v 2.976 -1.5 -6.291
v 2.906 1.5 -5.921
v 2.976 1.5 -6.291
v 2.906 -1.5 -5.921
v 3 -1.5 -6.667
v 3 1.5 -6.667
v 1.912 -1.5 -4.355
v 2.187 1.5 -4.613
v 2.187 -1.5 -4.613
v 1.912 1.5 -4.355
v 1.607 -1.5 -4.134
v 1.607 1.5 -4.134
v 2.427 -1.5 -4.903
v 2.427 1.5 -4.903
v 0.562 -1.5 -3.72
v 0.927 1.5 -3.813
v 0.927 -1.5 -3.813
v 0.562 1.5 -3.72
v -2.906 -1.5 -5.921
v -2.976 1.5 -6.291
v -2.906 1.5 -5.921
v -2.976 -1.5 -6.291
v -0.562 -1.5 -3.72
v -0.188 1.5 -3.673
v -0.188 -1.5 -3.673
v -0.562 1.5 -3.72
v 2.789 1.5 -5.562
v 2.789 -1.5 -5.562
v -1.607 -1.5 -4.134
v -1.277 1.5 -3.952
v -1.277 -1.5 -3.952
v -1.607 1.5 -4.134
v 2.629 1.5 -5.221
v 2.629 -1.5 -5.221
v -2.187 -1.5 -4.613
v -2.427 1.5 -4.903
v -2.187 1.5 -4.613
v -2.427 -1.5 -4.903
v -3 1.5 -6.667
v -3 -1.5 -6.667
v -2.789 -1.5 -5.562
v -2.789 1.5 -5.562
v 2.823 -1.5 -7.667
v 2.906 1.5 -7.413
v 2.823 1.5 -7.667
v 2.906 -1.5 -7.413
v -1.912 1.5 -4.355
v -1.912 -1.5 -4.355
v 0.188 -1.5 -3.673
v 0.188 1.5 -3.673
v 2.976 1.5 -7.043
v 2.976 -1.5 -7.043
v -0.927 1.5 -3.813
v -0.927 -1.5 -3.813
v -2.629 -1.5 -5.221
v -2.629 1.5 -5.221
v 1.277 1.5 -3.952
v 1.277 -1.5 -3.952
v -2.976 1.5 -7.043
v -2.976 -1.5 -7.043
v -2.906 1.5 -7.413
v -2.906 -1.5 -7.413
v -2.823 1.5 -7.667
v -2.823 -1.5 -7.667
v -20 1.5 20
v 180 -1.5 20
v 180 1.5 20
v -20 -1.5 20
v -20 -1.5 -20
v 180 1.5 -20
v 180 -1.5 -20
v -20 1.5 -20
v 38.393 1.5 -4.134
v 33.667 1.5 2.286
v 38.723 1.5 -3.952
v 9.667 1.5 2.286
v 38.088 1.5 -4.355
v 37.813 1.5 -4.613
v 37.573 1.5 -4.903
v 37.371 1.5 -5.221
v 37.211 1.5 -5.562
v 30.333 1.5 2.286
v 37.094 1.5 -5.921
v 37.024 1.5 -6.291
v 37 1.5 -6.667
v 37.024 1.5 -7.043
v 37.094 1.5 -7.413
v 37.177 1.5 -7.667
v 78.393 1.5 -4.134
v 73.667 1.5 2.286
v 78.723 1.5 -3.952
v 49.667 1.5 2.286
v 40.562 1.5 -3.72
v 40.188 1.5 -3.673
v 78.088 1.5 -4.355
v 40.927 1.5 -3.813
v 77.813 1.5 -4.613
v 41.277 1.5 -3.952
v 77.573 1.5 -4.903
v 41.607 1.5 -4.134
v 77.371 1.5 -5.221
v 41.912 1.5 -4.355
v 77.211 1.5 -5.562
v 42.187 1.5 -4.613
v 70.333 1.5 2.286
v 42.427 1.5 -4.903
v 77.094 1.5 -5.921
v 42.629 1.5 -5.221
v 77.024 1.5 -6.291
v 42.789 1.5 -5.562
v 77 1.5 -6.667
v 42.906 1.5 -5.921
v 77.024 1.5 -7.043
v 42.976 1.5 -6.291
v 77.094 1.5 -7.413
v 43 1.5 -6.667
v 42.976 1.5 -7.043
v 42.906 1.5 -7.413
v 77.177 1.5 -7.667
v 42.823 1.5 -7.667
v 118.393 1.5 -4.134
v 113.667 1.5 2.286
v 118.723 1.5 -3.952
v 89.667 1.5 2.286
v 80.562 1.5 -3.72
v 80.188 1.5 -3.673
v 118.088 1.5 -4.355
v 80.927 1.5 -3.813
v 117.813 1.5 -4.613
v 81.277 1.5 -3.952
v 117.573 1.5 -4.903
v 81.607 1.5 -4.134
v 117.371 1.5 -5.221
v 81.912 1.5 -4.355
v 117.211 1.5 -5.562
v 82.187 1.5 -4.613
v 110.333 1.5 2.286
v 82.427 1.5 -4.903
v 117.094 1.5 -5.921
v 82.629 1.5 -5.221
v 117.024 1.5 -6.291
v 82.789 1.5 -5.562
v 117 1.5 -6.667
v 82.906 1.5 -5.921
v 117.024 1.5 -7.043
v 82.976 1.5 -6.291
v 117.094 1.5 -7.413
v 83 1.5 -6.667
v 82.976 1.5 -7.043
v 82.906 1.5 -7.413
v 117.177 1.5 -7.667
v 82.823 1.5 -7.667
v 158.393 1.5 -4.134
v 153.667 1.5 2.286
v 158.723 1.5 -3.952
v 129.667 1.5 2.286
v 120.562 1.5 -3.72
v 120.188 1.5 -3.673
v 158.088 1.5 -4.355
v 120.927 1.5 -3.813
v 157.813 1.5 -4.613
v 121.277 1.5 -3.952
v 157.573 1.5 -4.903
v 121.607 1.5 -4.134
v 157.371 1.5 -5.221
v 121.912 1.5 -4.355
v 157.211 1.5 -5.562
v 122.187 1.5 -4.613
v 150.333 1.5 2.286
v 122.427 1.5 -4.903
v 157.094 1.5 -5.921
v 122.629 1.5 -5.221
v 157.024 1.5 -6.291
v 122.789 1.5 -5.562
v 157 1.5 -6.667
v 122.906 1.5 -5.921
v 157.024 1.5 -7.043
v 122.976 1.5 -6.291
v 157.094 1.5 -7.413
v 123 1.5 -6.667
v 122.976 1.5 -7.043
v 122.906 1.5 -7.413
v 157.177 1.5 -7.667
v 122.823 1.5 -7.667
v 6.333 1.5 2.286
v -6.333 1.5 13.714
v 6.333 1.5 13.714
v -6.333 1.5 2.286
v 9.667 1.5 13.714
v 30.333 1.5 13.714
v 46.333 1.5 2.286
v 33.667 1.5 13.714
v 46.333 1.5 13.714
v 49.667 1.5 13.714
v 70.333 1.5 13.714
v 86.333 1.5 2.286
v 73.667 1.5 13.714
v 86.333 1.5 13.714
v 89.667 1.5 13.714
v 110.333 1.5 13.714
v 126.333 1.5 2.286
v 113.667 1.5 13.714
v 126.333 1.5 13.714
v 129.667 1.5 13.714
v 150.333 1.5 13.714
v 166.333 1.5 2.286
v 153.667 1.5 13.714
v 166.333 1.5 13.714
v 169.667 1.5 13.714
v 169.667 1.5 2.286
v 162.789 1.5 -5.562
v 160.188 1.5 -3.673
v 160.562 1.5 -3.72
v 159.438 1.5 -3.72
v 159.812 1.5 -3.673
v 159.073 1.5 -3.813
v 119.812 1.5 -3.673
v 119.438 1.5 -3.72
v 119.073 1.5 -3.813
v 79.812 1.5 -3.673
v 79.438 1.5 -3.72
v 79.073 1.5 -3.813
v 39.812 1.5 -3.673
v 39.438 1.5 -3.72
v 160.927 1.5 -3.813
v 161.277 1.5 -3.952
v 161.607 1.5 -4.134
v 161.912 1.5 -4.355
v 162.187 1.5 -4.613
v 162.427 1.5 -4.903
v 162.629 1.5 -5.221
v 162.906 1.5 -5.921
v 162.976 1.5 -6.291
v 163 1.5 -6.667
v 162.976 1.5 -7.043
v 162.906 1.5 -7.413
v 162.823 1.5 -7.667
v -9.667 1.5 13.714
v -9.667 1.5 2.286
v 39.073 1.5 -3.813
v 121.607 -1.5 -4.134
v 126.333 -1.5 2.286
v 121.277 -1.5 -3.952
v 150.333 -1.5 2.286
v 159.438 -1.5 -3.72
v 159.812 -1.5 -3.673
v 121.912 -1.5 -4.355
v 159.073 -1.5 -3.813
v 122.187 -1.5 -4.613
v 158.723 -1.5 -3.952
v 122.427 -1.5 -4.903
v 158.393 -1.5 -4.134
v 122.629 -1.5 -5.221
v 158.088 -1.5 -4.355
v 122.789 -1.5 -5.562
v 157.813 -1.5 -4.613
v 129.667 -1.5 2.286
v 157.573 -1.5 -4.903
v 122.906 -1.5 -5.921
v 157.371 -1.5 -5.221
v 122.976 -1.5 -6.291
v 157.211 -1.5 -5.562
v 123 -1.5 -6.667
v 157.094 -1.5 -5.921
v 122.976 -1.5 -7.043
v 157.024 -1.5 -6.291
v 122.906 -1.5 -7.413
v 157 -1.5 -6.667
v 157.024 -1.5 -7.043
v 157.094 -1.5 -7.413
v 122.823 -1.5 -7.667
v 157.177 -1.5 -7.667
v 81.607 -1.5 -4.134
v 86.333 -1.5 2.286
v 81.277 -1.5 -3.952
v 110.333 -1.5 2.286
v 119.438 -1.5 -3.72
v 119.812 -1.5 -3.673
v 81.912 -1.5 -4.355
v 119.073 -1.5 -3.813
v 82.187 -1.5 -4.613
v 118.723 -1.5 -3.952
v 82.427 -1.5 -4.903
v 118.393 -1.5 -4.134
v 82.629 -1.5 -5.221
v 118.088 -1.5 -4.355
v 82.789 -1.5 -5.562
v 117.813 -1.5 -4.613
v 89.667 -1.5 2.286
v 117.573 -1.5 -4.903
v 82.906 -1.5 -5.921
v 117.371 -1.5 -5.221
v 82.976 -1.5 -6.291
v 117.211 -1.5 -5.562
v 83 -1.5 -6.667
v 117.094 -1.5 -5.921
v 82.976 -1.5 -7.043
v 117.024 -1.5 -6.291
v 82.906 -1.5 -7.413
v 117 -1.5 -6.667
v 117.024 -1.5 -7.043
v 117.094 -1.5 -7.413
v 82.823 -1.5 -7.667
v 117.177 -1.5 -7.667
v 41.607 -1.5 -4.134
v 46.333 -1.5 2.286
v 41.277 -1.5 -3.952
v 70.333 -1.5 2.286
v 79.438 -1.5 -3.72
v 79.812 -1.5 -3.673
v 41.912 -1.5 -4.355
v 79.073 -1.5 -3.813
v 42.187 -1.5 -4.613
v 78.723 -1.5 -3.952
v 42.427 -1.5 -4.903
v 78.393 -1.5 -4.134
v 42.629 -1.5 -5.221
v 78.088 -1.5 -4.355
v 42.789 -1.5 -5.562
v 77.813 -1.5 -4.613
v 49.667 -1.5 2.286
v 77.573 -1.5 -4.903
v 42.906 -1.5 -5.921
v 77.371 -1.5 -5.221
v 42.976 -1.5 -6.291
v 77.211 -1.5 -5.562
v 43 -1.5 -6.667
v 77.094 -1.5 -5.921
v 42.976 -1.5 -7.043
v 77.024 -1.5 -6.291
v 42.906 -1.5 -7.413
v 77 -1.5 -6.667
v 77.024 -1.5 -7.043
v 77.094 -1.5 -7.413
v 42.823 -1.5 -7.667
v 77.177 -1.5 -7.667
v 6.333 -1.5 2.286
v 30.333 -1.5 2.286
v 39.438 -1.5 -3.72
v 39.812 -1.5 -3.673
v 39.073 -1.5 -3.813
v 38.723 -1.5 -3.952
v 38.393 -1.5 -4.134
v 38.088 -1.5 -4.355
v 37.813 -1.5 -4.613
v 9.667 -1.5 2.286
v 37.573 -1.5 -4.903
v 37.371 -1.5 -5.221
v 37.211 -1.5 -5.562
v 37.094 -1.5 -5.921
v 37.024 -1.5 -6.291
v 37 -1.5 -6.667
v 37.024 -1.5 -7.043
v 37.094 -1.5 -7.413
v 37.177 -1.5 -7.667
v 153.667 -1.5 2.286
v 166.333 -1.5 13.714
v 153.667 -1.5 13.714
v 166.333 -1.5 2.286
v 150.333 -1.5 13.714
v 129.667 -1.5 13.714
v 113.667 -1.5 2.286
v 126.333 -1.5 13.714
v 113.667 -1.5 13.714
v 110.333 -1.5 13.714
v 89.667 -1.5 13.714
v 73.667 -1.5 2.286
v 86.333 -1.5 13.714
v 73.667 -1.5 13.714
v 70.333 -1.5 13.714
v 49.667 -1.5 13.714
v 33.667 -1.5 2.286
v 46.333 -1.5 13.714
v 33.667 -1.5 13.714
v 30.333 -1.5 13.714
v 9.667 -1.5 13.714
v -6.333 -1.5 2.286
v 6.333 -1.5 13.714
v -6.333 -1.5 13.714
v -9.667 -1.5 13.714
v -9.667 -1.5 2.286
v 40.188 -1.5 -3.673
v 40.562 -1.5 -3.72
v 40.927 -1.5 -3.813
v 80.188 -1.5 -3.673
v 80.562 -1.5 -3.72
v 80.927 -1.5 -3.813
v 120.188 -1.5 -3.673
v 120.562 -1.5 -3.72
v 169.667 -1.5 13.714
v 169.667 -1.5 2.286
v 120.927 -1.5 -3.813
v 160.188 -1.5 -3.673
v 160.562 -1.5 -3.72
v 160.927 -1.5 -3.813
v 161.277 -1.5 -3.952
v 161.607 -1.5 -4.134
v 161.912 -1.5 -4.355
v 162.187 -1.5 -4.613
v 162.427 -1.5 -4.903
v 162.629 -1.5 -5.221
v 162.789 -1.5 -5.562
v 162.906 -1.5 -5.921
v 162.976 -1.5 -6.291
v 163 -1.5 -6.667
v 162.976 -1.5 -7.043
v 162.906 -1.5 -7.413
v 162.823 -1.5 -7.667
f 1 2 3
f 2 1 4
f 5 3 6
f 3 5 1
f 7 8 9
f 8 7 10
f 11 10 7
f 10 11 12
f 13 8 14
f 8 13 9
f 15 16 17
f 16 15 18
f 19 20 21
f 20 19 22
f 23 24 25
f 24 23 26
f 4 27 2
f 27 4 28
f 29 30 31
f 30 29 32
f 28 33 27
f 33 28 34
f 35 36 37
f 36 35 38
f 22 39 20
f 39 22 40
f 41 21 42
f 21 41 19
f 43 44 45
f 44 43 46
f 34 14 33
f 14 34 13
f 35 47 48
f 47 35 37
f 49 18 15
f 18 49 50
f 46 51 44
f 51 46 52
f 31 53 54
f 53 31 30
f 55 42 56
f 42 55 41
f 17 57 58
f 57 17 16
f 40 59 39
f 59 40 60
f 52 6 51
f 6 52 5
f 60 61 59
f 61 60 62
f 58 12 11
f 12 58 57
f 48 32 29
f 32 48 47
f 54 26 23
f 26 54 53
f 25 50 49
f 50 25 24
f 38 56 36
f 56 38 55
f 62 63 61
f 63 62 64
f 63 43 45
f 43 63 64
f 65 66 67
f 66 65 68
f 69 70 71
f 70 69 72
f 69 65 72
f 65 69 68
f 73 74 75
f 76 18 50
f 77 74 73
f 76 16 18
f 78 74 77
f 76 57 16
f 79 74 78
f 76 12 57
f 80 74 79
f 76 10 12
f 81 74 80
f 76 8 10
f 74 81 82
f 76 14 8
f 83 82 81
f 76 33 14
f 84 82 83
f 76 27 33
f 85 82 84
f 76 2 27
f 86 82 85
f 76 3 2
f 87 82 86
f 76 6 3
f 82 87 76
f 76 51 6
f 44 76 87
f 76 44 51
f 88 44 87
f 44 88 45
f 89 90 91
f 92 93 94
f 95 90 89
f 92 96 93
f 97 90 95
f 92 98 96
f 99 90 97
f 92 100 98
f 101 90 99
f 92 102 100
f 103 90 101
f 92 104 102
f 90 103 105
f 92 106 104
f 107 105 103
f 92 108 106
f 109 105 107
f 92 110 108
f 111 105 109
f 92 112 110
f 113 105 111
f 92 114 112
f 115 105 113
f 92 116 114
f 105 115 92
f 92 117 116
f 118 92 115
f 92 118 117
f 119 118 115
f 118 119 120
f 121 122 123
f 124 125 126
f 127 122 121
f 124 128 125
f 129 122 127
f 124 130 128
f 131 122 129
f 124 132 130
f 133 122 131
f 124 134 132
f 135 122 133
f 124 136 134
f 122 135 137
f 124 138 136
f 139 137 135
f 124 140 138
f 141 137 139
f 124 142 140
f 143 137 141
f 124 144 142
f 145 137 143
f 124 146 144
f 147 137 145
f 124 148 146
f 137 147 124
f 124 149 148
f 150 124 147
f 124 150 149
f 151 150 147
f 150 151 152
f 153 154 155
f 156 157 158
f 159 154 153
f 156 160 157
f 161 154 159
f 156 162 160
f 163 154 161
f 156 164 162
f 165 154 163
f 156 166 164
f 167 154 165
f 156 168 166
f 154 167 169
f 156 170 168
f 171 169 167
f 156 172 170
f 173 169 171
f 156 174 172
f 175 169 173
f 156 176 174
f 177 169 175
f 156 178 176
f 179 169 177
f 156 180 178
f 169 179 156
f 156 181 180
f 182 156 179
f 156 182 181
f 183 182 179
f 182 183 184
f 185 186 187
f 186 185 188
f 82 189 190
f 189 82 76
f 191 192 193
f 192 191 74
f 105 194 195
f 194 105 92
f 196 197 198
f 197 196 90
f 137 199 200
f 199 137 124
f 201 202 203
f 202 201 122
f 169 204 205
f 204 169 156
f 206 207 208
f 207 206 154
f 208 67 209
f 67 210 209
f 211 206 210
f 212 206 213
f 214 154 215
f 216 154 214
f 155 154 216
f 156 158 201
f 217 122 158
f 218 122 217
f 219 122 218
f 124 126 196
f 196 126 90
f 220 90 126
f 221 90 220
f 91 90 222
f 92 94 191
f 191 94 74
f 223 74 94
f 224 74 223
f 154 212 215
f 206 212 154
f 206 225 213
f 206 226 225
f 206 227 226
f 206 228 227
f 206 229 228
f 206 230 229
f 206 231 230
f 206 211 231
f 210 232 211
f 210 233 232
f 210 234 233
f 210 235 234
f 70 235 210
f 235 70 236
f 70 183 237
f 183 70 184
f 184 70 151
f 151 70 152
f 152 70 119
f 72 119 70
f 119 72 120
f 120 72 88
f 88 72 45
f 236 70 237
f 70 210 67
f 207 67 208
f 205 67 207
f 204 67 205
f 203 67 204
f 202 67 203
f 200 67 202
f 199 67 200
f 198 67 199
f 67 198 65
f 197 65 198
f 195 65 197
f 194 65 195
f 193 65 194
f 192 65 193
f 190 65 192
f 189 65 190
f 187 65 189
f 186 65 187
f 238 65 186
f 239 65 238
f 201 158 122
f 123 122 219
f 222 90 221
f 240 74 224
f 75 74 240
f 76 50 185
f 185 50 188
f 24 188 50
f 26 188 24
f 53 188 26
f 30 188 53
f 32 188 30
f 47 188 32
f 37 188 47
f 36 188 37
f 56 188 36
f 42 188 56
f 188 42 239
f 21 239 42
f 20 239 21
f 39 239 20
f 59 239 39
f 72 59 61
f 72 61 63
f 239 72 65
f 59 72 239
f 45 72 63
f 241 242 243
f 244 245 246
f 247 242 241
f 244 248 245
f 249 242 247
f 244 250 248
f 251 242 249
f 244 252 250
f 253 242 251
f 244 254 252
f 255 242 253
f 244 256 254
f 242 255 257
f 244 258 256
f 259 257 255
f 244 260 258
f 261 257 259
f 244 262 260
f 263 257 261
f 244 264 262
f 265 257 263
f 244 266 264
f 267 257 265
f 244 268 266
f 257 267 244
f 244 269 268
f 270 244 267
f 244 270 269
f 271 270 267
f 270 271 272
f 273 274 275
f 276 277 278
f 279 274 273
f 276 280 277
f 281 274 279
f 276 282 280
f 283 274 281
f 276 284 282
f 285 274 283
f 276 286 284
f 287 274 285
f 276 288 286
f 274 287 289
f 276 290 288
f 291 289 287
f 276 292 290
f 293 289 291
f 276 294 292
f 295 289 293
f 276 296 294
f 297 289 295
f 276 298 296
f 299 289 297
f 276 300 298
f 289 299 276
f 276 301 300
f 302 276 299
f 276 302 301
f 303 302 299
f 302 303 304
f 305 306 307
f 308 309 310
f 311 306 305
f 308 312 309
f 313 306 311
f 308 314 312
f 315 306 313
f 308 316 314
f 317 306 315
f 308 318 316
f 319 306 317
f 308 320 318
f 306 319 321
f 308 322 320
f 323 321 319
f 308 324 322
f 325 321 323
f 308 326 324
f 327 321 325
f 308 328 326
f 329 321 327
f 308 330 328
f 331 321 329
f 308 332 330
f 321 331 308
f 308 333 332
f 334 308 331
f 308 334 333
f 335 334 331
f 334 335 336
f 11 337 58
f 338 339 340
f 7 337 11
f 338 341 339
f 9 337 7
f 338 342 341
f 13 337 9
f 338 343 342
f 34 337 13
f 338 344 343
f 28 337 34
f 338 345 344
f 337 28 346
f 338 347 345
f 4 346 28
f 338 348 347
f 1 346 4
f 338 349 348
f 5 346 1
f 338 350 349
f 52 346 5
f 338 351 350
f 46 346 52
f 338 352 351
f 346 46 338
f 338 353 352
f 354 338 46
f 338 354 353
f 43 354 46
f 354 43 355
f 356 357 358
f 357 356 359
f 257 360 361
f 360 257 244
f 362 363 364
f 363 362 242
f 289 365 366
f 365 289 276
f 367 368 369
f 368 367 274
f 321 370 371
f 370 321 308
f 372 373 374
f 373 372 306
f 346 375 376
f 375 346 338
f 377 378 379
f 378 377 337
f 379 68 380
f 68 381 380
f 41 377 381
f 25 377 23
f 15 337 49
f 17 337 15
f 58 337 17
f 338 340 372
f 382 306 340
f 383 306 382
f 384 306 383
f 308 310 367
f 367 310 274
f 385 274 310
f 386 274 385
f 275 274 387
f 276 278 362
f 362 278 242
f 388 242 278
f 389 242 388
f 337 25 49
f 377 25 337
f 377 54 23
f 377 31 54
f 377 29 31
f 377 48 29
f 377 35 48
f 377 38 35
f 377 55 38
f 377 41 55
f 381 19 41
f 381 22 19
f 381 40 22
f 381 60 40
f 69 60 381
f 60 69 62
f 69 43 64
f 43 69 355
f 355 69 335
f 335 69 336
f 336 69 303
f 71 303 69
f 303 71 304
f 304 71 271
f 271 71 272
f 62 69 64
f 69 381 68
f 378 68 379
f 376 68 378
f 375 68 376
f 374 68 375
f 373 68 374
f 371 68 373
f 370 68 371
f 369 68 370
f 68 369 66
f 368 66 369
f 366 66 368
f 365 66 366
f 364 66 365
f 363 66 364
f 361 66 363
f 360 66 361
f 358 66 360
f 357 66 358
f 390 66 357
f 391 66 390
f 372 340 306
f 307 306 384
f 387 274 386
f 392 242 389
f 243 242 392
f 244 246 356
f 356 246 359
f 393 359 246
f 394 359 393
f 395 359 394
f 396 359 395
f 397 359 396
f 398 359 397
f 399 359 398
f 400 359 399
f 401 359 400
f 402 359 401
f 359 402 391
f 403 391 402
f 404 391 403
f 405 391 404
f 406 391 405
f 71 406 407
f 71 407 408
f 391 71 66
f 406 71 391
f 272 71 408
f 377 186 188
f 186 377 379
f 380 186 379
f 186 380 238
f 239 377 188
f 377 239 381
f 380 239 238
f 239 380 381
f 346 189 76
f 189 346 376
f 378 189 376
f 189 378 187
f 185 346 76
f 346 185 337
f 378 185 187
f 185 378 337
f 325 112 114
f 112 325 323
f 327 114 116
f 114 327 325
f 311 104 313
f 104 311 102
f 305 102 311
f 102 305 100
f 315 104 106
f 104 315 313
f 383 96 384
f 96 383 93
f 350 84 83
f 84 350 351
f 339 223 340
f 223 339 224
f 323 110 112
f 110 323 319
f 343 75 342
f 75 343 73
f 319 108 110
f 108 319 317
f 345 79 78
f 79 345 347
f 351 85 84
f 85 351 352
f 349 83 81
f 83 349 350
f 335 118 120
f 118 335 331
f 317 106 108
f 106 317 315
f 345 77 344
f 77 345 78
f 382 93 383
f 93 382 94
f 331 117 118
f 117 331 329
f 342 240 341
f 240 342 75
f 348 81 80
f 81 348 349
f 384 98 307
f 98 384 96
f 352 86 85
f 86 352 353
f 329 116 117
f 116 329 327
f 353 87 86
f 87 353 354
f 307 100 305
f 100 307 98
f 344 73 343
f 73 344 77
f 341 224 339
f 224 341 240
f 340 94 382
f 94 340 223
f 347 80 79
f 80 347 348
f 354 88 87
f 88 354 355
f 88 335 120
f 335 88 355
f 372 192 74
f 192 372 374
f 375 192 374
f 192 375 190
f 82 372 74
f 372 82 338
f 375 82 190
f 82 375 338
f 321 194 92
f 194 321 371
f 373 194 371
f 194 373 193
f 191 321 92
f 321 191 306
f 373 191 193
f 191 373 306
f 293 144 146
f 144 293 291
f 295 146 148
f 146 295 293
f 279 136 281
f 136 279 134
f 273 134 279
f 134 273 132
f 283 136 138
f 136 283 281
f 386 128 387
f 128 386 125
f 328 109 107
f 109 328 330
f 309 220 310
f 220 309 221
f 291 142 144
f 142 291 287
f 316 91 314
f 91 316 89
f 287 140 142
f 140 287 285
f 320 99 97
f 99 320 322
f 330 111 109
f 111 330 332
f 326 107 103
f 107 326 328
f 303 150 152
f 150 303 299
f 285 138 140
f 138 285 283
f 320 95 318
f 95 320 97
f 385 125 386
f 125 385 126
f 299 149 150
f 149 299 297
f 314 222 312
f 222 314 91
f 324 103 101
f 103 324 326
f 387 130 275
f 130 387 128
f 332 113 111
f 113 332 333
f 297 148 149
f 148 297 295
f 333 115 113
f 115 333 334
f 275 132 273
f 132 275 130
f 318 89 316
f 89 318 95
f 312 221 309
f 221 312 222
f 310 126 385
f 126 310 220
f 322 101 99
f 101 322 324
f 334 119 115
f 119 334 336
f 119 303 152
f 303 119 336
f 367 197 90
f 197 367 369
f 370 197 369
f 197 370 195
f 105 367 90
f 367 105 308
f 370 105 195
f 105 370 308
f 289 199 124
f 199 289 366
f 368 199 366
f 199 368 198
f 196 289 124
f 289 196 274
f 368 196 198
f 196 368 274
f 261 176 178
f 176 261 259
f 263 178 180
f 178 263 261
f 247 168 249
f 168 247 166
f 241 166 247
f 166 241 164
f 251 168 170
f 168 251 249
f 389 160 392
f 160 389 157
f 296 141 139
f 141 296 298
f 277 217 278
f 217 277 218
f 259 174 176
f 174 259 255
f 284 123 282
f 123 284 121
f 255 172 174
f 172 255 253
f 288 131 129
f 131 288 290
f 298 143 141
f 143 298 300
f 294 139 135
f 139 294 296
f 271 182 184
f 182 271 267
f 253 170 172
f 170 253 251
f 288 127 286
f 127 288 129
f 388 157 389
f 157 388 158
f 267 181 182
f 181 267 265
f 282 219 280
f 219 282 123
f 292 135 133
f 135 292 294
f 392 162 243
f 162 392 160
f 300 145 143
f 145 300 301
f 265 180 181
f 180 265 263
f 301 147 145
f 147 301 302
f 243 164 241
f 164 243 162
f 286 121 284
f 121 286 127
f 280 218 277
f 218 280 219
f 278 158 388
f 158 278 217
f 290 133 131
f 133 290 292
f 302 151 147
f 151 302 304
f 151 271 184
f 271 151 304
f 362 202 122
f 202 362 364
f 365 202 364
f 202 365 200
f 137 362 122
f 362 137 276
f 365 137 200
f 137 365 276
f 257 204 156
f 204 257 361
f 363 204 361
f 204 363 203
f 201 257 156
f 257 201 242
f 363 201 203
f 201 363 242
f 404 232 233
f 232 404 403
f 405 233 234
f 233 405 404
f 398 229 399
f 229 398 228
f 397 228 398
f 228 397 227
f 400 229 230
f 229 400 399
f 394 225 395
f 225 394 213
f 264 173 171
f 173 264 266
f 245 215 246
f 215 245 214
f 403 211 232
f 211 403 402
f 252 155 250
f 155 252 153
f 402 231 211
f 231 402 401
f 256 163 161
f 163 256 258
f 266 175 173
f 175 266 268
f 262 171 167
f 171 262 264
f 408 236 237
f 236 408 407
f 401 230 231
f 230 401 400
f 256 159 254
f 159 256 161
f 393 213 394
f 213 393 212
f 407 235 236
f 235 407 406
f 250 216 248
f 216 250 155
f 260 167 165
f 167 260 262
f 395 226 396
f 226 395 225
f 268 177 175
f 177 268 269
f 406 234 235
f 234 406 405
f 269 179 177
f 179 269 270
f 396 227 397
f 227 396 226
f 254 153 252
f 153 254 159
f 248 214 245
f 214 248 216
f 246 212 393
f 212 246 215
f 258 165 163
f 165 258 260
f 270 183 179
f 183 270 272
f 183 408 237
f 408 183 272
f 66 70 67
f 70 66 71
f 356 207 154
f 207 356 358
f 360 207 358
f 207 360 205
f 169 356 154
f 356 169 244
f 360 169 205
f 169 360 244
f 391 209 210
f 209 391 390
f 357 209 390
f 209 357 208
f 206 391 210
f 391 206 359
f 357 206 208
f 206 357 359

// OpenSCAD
/*Outlet settings*/
outletWidth = 40;
outletHeight = 40;
outletThickness = 3;
holeRadius = outletWidth / 13.333333333333;

module outlet(w, t, h) {
    difference() {
        cube([w, t, h], center=true);
        translate([-w/5, 0, h/5]) {
            cube([(h/6) / 2, t*2, h/3.5], center=true);
        }
        translate([w/5, 0, h/5]) {
            cube([(h/6) / 2, t*2, h/3.5], center=true);
        }
        translate([0, 0, -h/6]) {
            difference() {
                rotate([90, 0, 0]) {
                    cylinder(h=t*2, r=holeRadius, center=true, $fn=50);
                }
                translate([-holeRadius, -t, (-holeRadius *2) - 1]) {
                    cube([holeRadius * 2, t*2, holeRadius * 2]);
                }
            }   
        }   
        
    }
}

for(i = [0:4]) {
    translate([outletWidth * i, 0, 0])
        outlet(outletWidth, outletThickness, outletHeight);

}
